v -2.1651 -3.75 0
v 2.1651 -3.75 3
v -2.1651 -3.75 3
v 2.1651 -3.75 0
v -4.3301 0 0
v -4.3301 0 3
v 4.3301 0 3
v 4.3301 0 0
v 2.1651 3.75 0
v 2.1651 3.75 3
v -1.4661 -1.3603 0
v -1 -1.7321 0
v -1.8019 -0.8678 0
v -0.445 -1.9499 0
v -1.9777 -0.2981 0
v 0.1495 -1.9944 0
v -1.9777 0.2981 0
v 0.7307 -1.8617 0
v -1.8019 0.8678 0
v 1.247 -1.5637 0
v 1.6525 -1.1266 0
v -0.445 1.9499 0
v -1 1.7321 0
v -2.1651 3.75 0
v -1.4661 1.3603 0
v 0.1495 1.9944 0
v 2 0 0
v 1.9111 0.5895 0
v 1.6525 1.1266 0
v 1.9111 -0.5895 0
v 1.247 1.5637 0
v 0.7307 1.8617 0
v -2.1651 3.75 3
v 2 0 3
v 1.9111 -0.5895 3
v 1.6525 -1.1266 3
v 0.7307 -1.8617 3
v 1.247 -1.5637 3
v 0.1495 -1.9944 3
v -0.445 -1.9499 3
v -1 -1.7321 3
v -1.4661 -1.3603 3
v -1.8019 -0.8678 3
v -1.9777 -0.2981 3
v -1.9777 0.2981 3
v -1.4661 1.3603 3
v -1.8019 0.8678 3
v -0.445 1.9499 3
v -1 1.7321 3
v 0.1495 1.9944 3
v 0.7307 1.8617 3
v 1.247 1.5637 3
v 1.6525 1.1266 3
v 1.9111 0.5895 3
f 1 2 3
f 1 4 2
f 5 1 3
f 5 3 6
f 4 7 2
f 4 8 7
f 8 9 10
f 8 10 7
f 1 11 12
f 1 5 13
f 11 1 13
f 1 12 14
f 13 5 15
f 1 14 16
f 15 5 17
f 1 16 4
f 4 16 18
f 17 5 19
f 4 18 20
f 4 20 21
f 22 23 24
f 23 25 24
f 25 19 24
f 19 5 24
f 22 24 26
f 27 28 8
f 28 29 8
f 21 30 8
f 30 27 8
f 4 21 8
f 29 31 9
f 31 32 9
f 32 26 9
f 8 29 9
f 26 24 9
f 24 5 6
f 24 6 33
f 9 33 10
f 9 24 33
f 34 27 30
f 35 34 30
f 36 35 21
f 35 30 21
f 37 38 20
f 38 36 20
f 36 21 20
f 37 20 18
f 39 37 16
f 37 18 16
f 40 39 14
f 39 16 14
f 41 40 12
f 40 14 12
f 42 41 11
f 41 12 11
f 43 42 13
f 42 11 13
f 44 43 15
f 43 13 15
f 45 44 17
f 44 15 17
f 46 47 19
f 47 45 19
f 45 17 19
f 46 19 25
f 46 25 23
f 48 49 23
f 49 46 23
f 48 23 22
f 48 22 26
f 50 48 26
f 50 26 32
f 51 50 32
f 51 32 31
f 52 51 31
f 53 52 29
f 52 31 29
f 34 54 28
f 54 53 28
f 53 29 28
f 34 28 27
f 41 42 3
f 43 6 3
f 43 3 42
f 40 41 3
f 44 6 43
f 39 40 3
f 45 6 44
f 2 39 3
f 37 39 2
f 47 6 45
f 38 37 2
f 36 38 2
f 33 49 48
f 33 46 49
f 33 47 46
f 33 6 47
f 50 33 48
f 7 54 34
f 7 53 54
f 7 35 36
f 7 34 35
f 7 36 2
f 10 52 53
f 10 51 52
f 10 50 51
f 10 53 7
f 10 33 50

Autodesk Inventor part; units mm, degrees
ref_plane "YZ Plane" through (0, 0, 0) normal (1, 0, 0) x (0, 1, 0)
ref_plane "XZ Plane" through (0, 0, 0) normal (0, 1, 0) x (-1, 0, 0)
ref_plane "XY Plane" through (0, 0, 0) normal (0, 0, 1) x (1, 0, 0)
sketch "Sketch1" plane through (0, 0, 0) normal (0, 0, 1) x (1, 0, 0)
  line L0 (2.1651, -3.75) -> (-2.1651, -3.75)
  line L1 (-2.1651, -3.75) -> (-4.3301, 0)
  line L2 (-4.3301, 0) -> (-2.1651, 3.75)
  line L3 (-2.1651, 3.75) -> (2.1651, 3.75)
  line L4 (2.1651, 3.75) -> (4.3301, 0)
  line L5 (4.3301, 0) -> (2.1651, -3.75)
  circle A0 centre (0, 0) radius 2
  line L6 (-6.0622, 0) -> (6.0622, 0) construction
  dimension "d0" = 7.5
  dimension "d1" = 4
extrude "Extrusion1" add sketch "Sketch1" along normal blind 3
properties part number "HexNut M4"
